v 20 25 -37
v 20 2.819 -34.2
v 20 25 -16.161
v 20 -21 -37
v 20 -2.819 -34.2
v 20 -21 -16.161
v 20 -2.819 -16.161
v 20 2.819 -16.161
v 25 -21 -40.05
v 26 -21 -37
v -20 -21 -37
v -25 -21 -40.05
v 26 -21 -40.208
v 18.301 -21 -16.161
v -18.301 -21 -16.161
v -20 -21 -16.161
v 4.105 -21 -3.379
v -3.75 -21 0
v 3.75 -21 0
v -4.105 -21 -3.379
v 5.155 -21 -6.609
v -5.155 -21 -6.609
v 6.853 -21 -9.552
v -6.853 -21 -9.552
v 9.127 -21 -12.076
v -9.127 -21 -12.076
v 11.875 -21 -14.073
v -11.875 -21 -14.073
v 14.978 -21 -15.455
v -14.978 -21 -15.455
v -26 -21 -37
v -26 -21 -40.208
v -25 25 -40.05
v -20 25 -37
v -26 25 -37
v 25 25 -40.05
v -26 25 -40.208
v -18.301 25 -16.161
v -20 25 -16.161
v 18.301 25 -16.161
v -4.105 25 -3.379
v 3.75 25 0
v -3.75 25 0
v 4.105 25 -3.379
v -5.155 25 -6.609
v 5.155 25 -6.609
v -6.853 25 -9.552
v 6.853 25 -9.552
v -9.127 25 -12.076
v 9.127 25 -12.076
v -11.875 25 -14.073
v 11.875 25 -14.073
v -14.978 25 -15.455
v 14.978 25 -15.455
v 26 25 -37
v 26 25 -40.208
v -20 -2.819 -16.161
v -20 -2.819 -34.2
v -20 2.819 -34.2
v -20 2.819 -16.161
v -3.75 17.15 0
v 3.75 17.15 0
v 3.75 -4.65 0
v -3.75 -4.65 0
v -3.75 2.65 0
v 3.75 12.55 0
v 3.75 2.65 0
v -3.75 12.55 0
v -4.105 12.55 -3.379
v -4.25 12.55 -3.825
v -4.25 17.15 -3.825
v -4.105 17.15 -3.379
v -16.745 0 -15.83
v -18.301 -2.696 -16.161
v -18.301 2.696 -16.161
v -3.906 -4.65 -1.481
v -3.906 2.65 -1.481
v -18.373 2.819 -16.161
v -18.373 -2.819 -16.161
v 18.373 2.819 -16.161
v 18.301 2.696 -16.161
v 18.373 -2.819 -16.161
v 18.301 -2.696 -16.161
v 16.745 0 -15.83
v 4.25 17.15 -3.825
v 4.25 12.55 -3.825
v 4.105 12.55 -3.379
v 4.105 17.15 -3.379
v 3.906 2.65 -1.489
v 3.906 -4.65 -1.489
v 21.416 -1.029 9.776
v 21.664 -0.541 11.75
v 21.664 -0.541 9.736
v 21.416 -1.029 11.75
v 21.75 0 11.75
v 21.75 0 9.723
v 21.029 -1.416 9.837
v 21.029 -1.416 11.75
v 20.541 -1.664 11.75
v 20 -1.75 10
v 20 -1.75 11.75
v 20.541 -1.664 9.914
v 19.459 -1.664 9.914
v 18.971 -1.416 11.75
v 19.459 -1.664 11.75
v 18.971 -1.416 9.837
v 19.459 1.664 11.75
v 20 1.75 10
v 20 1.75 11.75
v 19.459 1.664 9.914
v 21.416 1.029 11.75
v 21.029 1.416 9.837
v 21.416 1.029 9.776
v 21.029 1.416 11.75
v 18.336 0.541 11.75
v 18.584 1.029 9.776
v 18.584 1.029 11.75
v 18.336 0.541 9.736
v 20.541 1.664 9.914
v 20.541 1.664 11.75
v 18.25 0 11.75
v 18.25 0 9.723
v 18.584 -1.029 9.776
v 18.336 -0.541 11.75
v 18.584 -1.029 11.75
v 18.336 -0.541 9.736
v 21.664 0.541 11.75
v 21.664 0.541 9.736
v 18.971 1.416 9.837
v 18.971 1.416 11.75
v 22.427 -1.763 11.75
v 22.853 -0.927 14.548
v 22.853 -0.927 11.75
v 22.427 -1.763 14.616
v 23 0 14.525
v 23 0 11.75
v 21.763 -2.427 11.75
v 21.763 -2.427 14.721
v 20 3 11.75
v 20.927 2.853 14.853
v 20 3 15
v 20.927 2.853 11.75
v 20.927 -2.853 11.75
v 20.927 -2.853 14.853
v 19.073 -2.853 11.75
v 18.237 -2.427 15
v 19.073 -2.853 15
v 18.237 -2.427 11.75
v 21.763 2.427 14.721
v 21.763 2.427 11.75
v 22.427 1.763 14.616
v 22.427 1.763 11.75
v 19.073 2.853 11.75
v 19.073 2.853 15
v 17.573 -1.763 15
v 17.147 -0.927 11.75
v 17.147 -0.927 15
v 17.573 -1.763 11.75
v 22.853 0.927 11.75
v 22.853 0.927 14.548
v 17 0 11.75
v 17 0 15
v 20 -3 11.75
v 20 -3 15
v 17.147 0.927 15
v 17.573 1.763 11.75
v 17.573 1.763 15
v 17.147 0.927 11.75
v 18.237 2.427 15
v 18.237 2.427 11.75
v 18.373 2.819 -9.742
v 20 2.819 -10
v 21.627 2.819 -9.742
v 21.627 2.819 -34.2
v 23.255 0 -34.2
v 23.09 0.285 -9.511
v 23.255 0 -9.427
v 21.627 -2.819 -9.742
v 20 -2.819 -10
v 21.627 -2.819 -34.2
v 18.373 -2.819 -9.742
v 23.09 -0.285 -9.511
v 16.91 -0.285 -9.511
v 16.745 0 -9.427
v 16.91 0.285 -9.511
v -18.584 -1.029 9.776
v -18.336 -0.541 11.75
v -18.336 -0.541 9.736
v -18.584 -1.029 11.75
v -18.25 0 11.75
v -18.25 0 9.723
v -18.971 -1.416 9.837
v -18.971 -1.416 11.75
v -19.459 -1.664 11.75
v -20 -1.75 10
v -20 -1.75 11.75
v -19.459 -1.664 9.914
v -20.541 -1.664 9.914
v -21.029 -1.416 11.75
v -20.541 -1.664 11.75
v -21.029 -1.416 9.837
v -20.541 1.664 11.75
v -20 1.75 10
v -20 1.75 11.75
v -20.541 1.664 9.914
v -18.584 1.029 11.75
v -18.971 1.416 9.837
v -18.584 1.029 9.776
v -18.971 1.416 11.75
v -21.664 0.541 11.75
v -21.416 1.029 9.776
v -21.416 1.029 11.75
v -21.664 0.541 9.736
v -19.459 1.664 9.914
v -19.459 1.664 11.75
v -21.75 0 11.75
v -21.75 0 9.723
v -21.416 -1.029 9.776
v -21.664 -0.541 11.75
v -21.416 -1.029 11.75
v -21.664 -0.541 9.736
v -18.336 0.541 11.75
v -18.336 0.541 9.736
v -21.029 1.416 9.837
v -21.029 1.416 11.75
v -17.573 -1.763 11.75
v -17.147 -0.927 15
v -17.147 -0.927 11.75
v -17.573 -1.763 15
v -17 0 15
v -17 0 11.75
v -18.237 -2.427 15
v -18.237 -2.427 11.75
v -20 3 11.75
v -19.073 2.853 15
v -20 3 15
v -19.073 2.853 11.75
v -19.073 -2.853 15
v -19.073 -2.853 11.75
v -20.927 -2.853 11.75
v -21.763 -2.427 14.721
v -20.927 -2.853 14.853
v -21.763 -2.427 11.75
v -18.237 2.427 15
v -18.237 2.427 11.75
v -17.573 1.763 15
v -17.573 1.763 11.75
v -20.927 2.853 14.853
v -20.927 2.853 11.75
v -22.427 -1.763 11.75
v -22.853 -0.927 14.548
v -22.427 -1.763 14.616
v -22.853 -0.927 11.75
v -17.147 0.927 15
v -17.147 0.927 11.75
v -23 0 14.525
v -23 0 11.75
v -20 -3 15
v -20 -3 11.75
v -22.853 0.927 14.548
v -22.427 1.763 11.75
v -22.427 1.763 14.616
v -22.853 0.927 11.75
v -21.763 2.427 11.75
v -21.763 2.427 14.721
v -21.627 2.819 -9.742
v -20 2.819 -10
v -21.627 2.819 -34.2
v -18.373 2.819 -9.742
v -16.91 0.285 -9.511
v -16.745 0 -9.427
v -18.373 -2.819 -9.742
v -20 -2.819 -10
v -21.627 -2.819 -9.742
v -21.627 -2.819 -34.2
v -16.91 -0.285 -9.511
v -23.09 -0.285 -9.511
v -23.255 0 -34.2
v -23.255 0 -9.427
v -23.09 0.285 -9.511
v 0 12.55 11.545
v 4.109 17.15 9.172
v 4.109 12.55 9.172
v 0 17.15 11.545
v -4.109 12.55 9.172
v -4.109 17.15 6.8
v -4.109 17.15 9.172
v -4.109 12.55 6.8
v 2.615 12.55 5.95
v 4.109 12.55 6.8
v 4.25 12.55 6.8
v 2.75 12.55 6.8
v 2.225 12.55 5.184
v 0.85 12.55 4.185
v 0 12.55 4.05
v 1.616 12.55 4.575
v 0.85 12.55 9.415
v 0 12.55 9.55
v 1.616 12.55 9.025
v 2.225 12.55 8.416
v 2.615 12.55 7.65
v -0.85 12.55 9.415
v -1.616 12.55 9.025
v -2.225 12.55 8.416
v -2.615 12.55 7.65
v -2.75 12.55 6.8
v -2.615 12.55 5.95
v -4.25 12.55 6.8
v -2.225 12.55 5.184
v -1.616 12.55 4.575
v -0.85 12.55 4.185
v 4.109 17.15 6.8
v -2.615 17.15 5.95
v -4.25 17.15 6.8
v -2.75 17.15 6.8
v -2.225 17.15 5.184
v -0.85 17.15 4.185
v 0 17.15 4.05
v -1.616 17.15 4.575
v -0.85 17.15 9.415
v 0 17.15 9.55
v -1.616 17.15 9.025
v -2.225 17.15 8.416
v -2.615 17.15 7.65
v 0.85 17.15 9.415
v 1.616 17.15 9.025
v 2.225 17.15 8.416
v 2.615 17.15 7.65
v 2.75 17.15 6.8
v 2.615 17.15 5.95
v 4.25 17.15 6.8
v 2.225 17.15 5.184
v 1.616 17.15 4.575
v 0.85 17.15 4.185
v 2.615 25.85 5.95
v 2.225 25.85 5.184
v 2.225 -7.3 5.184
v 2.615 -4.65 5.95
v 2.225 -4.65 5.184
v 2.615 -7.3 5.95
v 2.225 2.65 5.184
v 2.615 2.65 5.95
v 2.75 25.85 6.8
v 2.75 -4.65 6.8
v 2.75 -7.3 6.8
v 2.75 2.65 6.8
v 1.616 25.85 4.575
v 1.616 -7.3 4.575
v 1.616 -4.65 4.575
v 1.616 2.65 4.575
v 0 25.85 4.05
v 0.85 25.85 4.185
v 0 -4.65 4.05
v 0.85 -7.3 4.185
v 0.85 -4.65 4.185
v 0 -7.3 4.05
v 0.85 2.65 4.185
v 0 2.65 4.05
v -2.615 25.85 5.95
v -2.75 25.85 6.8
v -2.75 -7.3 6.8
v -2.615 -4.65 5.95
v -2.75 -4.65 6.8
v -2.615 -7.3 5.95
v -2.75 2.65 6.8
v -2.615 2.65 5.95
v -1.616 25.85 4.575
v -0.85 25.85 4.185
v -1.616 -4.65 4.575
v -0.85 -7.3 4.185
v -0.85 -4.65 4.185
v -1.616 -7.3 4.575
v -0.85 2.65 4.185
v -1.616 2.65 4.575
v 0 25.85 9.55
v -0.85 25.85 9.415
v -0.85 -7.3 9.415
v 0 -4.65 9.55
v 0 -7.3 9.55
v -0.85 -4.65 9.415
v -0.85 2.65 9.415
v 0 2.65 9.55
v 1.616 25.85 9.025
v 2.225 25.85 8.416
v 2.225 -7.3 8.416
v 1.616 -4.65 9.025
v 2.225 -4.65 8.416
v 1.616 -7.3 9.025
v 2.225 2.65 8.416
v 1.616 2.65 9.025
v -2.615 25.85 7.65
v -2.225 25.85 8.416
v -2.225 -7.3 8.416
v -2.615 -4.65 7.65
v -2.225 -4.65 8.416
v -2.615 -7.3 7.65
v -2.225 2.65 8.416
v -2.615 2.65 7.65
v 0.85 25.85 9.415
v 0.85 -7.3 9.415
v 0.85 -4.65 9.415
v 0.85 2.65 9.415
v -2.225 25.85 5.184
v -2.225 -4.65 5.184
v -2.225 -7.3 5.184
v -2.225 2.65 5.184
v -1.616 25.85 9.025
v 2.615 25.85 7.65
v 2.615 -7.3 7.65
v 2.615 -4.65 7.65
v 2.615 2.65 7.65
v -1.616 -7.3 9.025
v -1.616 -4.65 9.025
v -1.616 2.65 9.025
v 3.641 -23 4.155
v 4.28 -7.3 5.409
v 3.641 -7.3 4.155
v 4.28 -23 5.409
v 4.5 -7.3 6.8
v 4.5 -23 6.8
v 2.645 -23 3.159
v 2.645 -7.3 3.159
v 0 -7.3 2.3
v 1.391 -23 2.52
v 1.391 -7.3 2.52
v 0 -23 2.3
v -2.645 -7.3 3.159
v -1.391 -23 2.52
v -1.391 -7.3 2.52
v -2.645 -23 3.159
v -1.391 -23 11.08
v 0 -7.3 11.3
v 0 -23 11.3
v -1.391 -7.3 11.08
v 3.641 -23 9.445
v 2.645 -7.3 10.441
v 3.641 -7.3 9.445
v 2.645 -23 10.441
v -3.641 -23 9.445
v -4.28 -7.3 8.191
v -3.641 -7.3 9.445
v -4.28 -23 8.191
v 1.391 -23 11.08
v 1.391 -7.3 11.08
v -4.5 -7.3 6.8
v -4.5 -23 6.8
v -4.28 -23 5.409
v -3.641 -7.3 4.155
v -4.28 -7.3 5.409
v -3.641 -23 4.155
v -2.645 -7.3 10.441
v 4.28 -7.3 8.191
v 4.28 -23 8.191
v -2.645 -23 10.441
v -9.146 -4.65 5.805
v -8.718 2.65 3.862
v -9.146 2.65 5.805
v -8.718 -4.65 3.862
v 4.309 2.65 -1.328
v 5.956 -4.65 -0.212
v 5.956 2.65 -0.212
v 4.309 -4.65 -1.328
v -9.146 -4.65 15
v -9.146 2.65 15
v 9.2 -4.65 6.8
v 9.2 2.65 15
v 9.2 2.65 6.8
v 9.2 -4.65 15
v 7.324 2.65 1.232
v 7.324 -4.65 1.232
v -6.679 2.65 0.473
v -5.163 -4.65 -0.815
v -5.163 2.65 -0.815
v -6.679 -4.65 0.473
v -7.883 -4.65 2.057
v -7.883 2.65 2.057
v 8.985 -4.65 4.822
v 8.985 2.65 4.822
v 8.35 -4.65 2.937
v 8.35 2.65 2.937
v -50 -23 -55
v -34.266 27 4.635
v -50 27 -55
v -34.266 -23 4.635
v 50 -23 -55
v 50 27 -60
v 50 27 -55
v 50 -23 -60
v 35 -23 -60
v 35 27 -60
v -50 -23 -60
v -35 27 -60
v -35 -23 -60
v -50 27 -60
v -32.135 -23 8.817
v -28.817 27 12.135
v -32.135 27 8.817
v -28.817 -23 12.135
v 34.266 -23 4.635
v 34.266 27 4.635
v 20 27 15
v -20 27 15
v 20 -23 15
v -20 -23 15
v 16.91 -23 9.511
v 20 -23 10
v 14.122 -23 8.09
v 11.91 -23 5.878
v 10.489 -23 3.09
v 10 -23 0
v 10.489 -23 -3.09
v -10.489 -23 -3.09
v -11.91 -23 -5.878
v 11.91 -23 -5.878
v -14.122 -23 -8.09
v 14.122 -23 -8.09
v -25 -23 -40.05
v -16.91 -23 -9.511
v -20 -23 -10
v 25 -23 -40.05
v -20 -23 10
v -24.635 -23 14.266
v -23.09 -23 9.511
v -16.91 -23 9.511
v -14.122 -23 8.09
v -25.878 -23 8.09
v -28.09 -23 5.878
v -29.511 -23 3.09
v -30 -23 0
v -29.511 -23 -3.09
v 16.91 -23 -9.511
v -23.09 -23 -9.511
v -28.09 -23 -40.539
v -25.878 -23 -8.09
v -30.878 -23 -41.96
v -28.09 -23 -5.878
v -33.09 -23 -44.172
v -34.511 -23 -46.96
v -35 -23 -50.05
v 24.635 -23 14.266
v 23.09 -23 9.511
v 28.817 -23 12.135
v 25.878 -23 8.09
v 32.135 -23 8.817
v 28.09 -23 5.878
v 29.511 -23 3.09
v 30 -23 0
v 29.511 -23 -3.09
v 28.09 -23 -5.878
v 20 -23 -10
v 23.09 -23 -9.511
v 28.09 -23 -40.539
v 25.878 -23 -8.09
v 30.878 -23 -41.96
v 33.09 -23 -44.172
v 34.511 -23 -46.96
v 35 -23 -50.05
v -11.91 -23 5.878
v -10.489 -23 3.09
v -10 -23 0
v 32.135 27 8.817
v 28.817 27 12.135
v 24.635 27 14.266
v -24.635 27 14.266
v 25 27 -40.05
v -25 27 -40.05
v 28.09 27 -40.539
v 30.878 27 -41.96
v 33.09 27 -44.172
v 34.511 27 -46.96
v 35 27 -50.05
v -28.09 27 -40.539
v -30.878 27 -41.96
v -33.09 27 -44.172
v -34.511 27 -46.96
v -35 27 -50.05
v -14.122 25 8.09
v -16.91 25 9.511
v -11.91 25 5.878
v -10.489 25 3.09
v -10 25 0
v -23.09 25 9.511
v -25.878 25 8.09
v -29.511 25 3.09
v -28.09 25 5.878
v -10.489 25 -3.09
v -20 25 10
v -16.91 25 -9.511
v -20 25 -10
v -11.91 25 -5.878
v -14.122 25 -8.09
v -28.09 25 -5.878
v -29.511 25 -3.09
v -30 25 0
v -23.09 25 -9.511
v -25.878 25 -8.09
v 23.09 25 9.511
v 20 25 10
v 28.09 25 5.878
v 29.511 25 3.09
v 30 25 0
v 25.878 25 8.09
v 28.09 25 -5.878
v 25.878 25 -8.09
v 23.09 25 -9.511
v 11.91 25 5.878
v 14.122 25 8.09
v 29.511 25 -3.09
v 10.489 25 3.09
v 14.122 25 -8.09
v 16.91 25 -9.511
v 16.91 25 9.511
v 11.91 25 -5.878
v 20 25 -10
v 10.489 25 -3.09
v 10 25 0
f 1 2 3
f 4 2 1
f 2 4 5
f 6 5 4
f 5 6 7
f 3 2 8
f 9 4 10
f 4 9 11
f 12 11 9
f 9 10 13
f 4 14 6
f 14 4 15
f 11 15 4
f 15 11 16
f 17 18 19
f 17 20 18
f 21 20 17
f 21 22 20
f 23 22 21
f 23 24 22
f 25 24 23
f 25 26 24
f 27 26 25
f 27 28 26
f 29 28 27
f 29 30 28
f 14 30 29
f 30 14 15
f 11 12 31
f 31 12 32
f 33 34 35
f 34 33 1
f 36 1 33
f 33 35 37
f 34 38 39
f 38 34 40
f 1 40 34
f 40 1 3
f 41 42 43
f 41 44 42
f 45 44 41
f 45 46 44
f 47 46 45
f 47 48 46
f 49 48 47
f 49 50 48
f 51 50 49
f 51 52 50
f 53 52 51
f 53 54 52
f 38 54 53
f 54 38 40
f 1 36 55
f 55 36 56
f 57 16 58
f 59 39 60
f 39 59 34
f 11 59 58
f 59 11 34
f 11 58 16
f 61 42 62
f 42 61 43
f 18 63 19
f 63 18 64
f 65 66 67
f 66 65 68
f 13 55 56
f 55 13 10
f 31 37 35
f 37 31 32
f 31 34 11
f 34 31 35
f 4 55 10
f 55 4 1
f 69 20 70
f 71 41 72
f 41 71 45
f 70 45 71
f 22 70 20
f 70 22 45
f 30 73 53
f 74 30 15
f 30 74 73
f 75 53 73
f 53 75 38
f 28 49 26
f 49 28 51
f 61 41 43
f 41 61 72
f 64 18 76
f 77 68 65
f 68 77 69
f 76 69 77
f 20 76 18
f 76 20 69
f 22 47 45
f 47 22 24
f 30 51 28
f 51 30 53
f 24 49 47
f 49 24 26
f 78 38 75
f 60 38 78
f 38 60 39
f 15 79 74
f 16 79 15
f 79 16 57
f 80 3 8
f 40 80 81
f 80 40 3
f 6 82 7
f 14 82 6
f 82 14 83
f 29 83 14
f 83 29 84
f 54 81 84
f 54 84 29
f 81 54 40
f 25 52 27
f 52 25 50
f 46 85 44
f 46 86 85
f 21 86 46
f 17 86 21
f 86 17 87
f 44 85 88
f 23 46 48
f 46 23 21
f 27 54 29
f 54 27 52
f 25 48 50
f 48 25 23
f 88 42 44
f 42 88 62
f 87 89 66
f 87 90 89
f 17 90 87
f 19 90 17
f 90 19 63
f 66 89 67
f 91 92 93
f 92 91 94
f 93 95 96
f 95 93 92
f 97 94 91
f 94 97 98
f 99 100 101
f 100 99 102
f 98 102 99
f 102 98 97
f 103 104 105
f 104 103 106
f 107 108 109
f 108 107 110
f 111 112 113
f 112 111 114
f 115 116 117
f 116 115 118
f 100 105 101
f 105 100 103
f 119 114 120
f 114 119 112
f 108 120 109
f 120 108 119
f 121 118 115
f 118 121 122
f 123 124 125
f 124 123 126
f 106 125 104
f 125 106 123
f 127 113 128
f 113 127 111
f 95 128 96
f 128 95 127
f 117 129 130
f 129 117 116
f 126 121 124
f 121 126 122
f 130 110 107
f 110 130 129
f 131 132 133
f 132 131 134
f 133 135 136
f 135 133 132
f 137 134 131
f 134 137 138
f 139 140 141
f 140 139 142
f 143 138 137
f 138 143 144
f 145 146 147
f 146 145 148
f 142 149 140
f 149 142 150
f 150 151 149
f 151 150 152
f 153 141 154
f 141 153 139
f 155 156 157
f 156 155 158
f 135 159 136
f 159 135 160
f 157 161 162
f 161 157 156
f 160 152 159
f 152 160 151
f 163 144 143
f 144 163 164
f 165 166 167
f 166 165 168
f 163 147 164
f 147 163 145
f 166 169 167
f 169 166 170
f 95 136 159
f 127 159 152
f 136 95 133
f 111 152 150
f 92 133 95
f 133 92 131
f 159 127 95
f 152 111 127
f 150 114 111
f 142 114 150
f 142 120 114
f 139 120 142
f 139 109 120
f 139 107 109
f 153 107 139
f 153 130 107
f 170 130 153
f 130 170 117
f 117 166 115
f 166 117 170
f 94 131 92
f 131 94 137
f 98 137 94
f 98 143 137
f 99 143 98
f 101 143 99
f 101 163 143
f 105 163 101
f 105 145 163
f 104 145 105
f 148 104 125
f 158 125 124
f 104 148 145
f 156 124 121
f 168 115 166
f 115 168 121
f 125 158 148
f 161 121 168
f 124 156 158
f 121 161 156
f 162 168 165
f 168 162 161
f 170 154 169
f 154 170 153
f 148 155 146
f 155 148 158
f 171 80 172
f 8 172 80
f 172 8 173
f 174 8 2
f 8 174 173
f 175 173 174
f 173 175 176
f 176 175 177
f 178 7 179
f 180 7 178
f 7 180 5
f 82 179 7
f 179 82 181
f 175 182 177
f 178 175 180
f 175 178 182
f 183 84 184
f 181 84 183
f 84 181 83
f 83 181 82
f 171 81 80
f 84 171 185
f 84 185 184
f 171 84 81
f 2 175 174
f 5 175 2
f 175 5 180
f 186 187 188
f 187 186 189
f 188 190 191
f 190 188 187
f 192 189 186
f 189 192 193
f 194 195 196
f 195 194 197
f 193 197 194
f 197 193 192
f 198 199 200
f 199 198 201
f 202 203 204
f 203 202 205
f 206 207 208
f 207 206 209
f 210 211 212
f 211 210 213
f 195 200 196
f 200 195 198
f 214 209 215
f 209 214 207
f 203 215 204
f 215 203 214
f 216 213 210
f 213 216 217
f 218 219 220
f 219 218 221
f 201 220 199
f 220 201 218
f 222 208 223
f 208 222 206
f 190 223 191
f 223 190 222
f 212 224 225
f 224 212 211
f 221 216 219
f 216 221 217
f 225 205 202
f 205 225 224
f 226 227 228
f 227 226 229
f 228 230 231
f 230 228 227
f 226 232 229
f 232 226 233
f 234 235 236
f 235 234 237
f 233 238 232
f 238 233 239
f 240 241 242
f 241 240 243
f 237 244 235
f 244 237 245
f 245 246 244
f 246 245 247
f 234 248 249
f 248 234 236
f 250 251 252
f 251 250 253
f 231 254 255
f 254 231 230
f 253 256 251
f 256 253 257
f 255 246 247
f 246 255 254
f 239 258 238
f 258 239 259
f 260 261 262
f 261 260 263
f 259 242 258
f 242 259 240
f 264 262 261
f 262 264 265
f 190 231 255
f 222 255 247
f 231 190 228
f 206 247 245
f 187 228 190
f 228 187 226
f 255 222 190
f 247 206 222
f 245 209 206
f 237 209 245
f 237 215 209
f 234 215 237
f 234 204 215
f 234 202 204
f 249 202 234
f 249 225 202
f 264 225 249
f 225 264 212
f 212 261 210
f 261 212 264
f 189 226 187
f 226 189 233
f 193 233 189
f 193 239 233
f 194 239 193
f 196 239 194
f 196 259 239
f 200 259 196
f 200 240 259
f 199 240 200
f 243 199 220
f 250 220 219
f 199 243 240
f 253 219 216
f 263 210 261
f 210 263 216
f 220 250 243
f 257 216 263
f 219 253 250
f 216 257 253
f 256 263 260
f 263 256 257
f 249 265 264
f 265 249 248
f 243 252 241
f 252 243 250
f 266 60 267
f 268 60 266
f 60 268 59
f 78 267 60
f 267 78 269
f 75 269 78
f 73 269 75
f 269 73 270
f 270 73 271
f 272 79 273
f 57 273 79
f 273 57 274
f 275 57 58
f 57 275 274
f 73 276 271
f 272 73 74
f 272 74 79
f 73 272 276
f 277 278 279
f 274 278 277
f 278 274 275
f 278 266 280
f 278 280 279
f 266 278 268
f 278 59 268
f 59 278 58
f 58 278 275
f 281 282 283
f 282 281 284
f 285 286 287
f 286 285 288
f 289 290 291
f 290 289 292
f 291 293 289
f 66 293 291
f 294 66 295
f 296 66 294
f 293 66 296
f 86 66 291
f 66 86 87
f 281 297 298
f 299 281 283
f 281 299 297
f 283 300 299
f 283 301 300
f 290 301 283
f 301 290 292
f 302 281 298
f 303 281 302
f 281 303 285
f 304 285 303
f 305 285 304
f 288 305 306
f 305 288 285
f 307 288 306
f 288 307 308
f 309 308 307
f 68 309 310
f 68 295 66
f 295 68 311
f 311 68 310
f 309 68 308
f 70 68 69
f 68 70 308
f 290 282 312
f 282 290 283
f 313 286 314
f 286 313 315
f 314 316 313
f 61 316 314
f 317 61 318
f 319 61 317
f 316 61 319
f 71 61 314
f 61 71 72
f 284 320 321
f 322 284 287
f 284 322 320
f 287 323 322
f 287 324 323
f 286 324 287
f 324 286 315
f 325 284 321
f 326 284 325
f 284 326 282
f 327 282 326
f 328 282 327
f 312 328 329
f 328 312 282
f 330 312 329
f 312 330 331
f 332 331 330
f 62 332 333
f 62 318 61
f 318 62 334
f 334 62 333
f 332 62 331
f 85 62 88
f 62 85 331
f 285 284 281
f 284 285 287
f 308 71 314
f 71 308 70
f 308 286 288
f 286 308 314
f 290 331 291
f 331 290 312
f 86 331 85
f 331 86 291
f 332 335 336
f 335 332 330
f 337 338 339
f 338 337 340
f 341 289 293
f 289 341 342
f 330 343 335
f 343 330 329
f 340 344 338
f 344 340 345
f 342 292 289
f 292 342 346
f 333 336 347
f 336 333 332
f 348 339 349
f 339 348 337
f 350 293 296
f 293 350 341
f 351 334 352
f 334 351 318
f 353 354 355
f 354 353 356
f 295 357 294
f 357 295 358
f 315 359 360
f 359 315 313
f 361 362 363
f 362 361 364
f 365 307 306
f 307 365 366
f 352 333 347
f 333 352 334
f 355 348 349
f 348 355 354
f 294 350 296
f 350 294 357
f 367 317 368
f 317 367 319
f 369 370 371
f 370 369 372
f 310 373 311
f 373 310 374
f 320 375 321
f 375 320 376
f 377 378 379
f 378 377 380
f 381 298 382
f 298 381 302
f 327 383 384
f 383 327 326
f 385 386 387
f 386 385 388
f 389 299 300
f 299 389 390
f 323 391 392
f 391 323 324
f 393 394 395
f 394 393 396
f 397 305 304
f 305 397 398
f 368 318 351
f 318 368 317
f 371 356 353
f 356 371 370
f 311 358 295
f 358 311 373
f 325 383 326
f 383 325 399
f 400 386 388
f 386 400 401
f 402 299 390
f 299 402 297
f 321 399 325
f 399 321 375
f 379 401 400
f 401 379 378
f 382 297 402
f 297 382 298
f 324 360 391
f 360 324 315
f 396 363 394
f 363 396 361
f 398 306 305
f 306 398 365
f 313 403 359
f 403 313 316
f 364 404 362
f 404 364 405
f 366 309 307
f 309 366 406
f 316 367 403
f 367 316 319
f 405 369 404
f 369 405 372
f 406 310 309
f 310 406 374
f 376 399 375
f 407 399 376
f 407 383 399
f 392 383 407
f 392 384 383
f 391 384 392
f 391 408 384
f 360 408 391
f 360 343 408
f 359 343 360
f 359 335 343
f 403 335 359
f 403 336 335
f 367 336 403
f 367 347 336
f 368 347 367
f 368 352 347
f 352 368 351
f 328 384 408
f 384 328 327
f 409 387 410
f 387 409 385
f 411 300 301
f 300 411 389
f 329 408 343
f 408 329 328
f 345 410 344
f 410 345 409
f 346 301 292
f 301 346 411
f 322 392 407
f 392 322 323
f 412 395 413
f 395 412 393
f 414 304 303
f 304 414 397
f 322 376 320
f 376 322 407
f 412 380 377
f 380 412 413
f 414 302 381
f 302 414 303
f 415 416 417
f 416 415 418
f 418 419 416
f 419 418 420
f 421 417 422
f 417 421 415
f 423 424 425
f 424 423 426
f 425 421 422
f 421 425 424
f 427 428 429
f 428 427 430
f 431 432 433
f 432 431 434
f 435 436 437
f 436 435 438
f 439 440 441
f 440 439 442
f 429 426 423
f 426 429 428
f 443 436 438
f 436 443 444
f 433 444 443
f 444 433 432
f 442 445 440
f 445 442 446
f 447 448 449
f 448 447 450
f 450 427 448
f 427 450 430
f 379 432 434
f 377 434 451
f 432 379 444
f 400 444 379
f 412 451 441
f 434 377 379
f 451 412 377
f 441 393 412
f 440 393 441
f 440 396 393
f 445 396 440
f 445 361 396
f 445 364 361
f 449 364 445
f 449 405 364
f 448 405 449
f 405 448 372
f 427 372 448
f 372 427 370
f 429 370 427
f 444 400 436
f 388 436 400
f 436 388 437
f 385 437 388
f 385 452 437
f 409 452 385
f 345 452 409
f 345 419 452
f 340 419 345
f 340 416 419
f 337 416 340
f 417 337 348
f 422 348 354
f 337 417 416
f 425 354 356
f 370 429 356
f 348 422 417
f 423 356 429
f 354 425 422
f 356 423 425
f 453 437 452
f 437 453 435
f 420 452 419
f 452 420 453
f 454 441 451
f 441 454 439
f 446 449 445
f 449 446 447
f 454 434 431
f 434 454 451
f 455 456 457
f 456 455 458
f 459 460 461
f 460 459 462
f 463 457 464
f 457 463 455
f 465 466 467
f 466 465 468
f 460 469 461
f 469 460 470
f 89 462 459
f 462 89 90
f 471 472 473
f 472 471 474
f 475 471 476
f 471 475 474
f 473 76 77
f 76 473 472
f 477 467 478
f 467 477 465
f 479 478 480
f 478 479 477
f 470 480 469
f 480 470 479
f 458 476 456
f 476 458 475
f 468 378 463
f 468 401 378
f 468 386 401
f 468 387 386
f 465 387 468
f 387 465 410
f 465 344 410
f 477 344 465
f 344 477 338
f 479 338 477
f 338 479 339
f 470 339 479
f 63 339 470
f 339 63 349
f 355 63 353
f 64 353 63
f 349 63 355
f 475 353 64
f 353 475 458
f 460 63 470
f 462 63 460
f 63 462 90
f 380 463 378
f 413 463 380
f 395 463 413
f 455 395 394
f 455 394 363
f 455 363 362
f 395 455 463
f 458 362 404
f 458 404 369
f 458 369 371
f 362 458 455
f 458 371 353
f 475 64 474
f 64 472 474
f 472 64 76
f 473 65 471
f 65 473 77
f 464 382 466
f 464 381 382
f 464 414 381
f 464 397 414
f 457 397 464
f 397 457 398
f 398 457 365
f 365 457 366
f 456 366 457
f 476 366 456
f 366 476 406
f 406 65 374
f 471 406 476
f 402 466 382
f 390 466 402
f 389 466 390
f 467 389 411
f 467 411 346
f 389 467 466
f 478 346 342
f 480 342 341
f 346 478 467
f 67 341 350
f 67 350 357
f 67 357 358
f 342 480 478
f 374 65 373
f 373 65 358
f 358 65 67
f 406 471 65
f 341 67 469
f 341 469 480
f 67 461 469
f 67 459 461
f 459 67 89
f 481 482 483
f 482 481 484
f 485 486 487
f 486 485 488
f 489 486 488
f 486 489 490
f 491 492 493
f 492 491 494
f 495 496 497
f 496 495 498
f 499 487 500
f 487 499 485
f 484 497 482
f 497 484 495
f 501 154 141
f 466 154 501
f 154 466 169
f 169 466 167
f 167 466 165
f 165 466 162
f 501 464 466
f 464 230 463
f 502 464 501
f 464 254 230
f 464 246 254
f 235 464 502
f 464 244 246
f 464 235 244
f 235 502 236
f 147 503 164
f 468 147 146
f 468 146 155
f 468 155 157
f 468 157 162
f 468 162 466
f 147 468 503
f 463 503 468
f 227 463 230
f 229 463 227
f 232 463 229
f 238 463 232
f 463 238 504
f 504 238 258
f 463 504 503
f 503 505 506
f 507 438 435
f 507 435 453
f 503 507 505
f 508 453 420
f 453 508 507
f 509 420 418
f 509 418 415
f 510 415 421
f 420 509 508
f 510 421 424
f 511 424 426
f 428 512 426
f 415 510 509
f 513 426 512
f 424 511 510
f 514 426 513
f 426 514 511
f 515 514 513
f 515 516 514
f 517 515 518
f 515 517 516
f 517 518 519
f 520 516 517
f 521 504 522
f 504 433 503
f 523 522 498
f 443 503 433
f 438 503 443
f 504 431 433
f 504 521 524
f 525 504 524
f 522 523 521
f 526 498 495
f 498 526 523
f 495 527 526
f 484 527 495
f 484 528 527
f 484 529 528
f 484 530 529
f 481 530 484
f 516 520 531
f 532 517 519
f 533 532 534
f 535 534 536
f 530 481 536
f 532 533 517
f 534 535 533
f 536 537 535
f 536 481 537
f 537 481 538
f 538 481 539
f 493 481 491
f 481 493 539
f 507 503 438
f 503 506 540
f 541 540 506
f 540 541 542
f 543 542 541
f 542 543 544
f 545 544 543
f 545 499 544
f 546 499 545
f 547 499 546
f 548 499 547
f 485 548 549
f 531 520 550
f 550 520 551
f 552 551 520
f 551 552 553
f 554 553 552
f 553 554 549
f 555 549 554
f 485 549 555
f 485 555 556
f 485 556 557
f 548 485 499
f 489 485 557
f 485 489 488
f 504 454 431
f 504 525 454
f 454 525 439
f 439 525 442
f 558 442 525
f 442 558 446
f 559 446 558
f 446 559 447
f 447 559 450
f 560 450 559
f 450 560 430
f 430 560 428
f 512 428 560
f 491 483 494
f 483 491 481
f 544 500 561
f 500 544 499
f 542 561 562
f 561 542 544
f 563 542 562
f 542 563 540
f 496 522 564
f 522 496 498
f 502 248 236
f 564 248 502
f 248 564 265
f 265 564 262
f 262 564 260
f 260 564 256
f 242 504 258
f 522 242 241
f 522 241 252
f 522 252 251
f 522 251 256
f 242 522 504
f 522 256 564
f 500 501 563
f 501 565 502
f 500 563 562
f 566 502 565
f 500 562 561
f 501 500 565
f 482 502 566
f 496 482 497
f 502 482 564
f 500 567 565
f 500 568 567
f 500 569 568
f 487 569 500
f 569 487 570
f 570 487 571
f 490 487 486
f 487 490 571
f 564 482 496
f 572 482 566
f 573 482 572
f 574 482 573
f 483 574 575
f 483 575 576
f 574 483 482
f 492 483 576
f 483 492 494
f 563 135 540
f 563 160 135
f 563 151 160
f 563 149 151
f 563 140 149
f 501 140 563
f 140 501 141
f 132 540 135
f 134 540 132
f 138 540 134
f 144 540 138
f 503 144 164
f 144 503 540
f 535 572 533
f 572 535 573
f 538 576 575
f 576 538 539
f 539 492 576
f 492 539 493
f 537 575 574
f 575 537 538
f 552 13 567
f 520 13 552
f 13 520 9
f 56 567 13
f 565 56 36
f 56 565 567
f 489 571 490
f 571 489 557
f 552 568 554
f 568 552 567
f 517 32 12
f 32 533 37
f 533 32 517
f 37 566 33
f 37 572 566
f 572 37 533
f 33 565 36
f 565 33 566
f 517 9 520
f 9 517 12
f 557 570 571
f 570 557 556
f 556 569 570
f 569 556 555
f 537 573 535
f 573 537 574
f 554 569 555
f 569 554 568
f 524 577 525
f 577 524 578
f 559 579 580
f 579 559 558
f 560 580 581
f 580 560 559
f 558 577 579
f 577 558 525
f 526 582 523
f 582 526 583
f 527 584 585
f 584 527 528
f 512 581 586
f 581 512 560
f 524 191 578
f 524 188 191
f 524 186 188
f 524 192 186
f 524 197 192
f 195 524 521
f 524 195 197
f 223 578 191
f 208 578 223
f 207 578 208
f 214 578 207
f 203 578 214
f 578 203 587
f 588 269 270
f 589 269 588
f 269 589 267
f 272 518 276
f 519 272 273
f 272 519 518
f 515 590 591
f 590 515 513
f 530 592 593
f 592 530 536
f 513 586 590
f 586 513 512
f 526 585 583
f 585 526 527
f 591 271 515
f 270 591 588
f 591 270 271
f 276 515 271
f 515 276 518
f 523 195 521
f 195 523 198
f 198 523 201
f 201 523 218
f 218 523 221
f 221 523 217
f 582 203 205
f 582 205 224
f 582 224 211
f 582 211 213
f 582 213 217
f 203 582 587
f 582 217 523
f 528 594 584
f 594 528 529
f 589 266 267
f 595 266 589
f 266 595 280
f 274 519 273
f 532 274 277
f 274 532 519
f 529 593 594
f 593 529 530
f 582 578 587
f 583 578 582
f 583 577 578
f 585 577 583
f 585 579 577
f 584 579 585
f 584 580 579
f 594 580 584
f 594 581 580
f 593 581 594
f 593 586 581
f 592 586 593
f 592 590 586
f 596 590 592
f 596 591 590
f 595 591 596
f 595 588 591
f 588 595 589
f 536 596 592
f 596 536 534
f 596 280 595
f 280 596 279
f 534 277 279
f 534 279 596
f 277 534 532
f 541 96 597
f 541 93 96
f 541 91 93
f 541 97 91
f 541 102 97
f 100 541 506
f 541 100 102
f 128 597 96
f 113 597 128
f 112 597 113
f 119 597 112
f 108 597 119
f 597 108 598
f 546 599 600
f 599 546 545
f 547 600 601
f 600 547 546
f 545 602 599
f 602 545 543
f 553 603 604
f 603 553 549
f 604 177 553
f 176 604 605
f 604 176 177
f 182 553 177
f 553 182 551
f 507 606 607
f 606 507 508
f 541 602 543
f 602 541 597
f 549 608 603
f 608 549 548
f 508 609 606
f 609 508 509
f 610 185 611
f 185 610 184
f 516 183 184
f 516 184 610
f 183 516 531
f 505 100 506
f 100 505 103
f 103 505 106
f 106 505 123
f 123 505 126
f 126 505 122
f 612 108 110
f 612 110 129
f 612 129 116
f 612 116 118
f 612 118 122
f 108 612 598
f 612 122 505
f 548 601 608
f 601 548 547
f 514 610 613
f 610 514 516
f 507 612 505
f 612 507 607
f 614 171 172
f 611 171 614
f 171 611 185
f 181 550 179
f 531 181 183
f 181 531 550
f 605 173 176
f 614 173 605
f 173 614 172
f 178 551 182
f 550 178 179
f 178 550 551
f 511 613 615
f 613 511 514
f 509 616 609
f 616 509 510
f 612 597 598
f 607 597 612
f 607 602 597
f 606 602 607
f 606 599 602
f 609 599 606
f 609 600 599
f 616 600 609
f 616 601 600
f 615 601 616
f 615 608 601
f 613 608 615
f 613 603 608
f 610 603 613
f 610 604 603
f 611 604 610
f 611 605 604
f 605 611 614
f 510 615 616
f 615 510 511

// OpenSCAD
translate(v = [0, 27.0000000000, 0]) {
	rotate(a = [90, 0, 0]) {
		difference() {
			hull() {
				union() {
					translate(v = [-20.0000000000, 0, 0]) {
						cylinder($fn = 20, d = 30, h = 50);
					}
					translate(v = [20.0000000000, 0, 0]) {
						cylinder($fn = 20, d = 30, h = 50);
					}
					translate(v = [-50.0000000000, -60, 0]) {
						cube(size = [100, 5, 50]);
					}
				}
			}
			hull() {
				translate(v = [0, -50.0500000000, -0.0250000000]) {
					union() {
						translate(v = [-25.0000000000, 0, 0]) {
							cylinder($fn = 20, d = 20, h = 50.0500000000);
						}
						translate(v = [25.0000000000, 0, 0]) {
							cylinder($fn = 20, d = 20, h = 50.0500000000);
						}
						translate(v = [-35.0000000000, -10, 0]) {
							cube(size = [70, 5, 50.0500000000]);
						}
					}
				}
			}
			difference() {
				union() {
					translate(v = [-20.0000000000, -60, 2]) {
						cube(size = [40, 60, 46]);
					}
					translate(v = [-26.0000000000, -60, 2]) {
						cube(size = [52.0000000000, 23.0000000000, 46]);
					}
				}
				translate(v = [-20.0000000000, 0, 0]) {
					cylinder(d = 32.5000000000, h = 50);
				}
				translate(v = [20.0000000000, 0, 0]) {
					cylinder(d = 32.5000000000, h = 50);
				}
			}
			translate(v = [-20.0000000000, 0, 2]) {
				cylinder($fn = 20, d = 20, h = 50);
			}
			translate(v = [20.0000000000, 0, 2]) {
				cylinder($fn = 20, d = 20, h = 50);
			}
			translate(v = [20.0000000000, 15.0000000000, 27.0000000000]) {
				rotate(a = [90, 0, 0]) {
					translate(v = [0, 0, 3.2000000000]) {
						union() {
							translate(v = [0, 0, false]) {
								cylinder($fn = 20, d = 3.5000000000, h = 38.2000000000);
							}
							translate(v = [0, 0, -13.1500000000]) {
								cylinder($fn = 20, d = 6.0000000000, h = 13.2000000000);
							}
							translate(v = [0, 0, 21]) {
								cylinder($fn = 6, d = 6.5100000000, h = 25);
							}
						}
					}
				}
			}
			translate(v = [-20.0000000000, 15.0000000000, 27.0000000000]) {
				rotate(a = [90, 0, 0]) {
					translate(v = [0, 0, 3.2000000000]) {
						union() {
							translate(v = [0, 0, false]) {
								cylinder($fn = 20, d = 3.5000000000, h = 38.2000000000);
							}
							translate(v = [0, 0, -13.1500000000]) {
								cylinder($fn = 20, d = 6.0000000000, h = 13.2000000000);
							}
							translate(v = [0, 0, 21]) {
								cylinder($fn = 6, d = 6.5100000000, h = 25);
							}
						}
					}
				}
			}
			translate(v = [0, 6.8000000000, 24.3500000000]) {
				hull() {
					cylinder(d = 18.4000000000, h = 7.3000000000);
					translate(v = [0, 16.4000000000, 0]) {
						cylinder(d = 18.4000000000, h = 7.3000000000);
					}
				}
				rotate(a = [180, 0, 0]) {
					translate(v = [0, 0, -10.0000000000]) {
						union() {
							translate(v = [0, 0, false]) {
								cylinder($fn = 20, d = 5.5000000000, h = 33.2000000000);
							}
							translate(v = [0, 0, -55.1500000000]) {
								cylinder($fn = 20, d = 9.0000000000, h = 55.2000000000);
							}
							translate(v = [0, 0, 19.9000000000]) {
								rotate(a = [90, 0, 180]) {
									union() {
										rotate(a = [-90, 90, 0]) {
											cylinder($fn = 6, d = 9.4900000000, h = 4.6000000000);
										}
										translate(v = [-4.2500000000, 0, 0]) {
											cube(size = [8.5000000000, 4.6000000000, 100]);
										}
									}
								}
							}
						}
					}
				}
			}
		}
	}
}
/***********************************************
*********      SolidPython code:      **********
************************************************
 
import os
cq = 20

render = False
os.environ["PRINTEDSCOPE_QUALITY"] = str(cq)

from lib.global_parameters import *
from lib.model_parameters import *
from solid import *
from solid.utils import *
import numpy as np


g1p1_bearing = bearing_625
g1g1_space = 3 # jak velka bude mezera mezi zakladnou na zemi a AZ sestavou
g1p1_pipe_center_distance = 20 # jak daleko konci trubka od stredu
g1_pipe_in = 40
g1p1_diameter = 60
g1_foot_height = 60
g1_pipe_bolt = get_optimal_bolt(3, base_pipe['D']+5)



g1_foot_length = 100
g1_foot_width = 50
g1_pipe_distance = 40
g1_pipe = pipe_20_2
g1_pipe['min_wall'] = 5
g1p4_wall = 2

g1_foot_bridge_height = 10
g1_foot_bridge_length =  g1_foot_length-50

#g1_foot_length = g1_pipe_distance+g1_pipe['D']+2*g1_pipe['min_wall']

# kostka, na ktere to lezi na zemi...
g1p2_width = 50
g1p2_length = 100
g1p2_height = g1_foot_height

def s111g1p01():
	pipe_bolt = g1_pipe_bolt
	pipe_height = pipe_bolt['l']
	pipe_height += pipe_bolt['k']
	bottom = -(pipe_height-g1_pipe['min_wall']-g1_pipe['D']/2)-clear

	m= cylinder(h=pipe_height, d=100)
	for x in range(3):
		m+= rotate([0, 0, 360/3*x])(
			translate([0, -(g1_pipe['D']+g1_pipe_distance+2*g1_pipe['min_wall'])/2,0])(
				cube([g1p1_diameter, g1_pipe['D']+g1_pipe_distance+2*g1_pipe['min_wall'], pipe_height])
			)
		)
	m = down(pipe_height-g1_pipe['min_wall']-g1_pipe['D']/2)(m)
	#m = hull()(m)

	m+= up(pipe_height/2-1.1)(
			difference()(
				cylinder(h=5, d=80, segments=cq),
				down(clear/2)(cylinder(h=10+clear, d=80-3, segments=cq))
			)
		)
	
	m-=(up(pipe_height/2-g1_pipe['min_wall']+1)(cylinder(h=5+clear, d1=80-3-5, d2=80-3, segments=cq)))


	for x in range(3):
		m-= rotate([0, 90, 360/3*x])(
			# diry pro zastrceni trubky
			translate([0, -g1_pipe_distance/2, g1p1_pipe_center_distance])(
				cylinder(d= base_pipe['D'], h=100, segments=cq)
			),
			translate([0, g1_pipe_distance/2, g1p1_pipe_center_distance])(
				cylinder(d= base_pipe['D'], h=100, segments=cq)
			),
			# diry pro pridelani trubek
			translate([2, -g1_pipe_distance/2, g1p1_diameter*0.75])(
				rotate([0, -90, 0])(
					bolt_hole(pipe_bolt, nut=-3, align='center')
				)
			),
			translate([2, g1_pipe_distance/2, g1p1_diameter*0.75])(
				rotate([0, -90, 0])(
					(bolt_hole(pipe_bolt, nut=-3, align='center'))
				)
			),

			# otvor pro srouby pro pridelani lozisek
			translate([0, 0, (g1p1_bearing['D'])])(
				left(bottom+pipe_height-2-M3['k']-g1p1_bearing['B'])(
					rotate([0, 180, 90])(
						nut_pocket(pipe_bolt, g1p1_bearing['D'])
					)
				),
				left(bottom-1+M3['m']+g1p1_bearing['B'])(
					rotate([0, 180, 90])(
						nut_pocket(pipe_bolt, g1p1_bearing['D'])
					)
				),
				left(bottom+50)(rotate([0, 90, 0])(
					cylinder(d=M3['d'], h=100, segments=cq)
				))
			)
		)

	# dira pro vyvedeni kabelu
	m -= translate([20, base_pipe['D'], bottom+pipe_height/2+clear])(
			cylinder(d=10, h=pipe_height/2+clear)
		)
	m -= translate([20, -base_pipe['D'], bottom+pipe_height/2+clear])(
			cylinder(d=10, h=pipe_height/2+clear)
		)

	# diry skrz pro loziska a sroub M5 a osazeni pro pridelani loziska
	m -= up(bottom)(
			cylinder(d=g1p1_bearing['D']+4*M3['dk']+1, h=M3['k']+2)
		)
	m -= up(bottom+M3['k']+2+layer*1)(
			cylinder(d=g1p1_bearing['D'], h=g1p1_bearing['B'])
		)
	m -= up(bottom+M3['k']+2+layer*2+g1p1_bearing['B'])(
			cylinder(d=g1p1_bearing['D']-4, h=50)
		)
	m -= up(bottom+pipe_height-M3['k']-2- g1p1_bearing['B'])(
			cylinder(d=g1p1_bearing['D'], h=g1p1_bearing['B'])
		)
	m -= up(bottom+pipe_height-M3['k']-2-clear)(
			cylinder(d=g1p1_bearing['D']+4*M3['dk']+1, h=50)
		)

	return m

def s111g1p02():
	m = cylinder(d=g1p1_bearing['D']+4*M3['dk'], h=M3['k']+2)
	m-= down(clear/2)(cylinder(d=g1p1_bearing['bolt']['dk']+1, h=M3['k']+2+clear))
	for x in range(3):
		m-=rotate([180, 0, 360/3*x])(
			translate([-g1p1_bearing['D'], 0, -M3['k']])(
				bolt_hole(M3, l=30)
			)
		)

	return m

def s111g1p03():
	m = cylinder(d=g1p1_bearing['D']+4*M3['dk'], h=M3['k']+2)
	m-= down(clear/2)(cylinder(h=3, d=25))
	m-= down(clear/2)(cylinder(d=g1p1_bearing['D']-3, h=M3['k']+2+clear))
	for x in range(3):
		m-=rotate([180, 0, 360/3*x])(
			translate([-g1p1_bearing['D'], 0, -M3['k']])(
				bolt_hole(M3, l=30)
			)
		)

	return m

def s111g1p04():

	## zakladni tvar nohy
	m = left(g1_pipe_distance/2)(
			cylinder(h=g1_foot_width, d=g1_pipe['D']+g1_pipe['min_wall']*2, segments=cq)
		)
	m += right(g1_pipe_distance/2)(
			cylinder(h=g1_foot_width, d=g1_pipe['D']+g1_pipe['min_wall']*2, segments=cq)
		)
	m += translate([-g1_foot_length/2, -g1_foot_height, 0])(
			cube([g1_foot_length, 5, g1_foot_width])
		)
	m = hull()(m)


	## odebrani premosteni
	r = left(g1_foot_bridge_length/2)(
			cylinder(h=g1_foot_width+clear, d=g1_pipe['D'], segments=cq)
		)
	r += right(g1_foot_bridge_length/2)(
			cylinder(h=g1_foot_width+clear, d=g1_pipe['D'], segments=cq)
		)
	r += translate([-(g1_foot_bridge_length+g1_pipe['D'])/2, -g1_foot_bridge_height, 0])(
			cube([(g1_foot_bridge_length+g1_pipe['D']), 5, g1_foot_width+clear])
		)
	r = hull()(translate([0, -g1_foot_height+g1_foot_bridge_height-clear, -clear/2])(r))
	m-=r


	## odebrani diry pro elektroniku
	r = translate([-g1_pipe_distance/2, -g1p2_height, g1p4_wall])(
			cube([g1_pipe_distance, g1p2_height, g1_foot_width-2*g1p4_wall])
		)
	r += translate([-g1_pipe_distance/2-M3['dk']*1, -g1p2_height, g1p4_wall])(
			cube([g1_pipe_distance+M3['dk']*2, g1_foot_bridge_height+base_pipe['D']/2+5, g1_foot_width-2*g1p4_wall])
		)
	
	r -= left(g1_pipe_distance/2)(
			cylinder(h=g1_foot_width, d=g1_pipe['D']+2.5*g1_pipe['min_wall'])
		)
	r -= right(g1_pipe_distance/2)(
			cylinder(h=g1_foot_width, d=g1_pipe['D']+2.5*g1_pipe['min_wall'])
		)
	#r -= up(20)(
	#		cylinder(h=g1_foot_width-20, d=g1p1_bearing['D']+1)
	#	)
	m-=(r)

	## diry na trubky a srouby skrz trubky
	m -= translate([-g1_pipe_distance/2, 0, 2])(
			cylinder(h=g1_foot_width, d=g1_pipe['D'], segments=cq)
		)
	m -= translate([g1_pipe_distance/2, 0,2])(
			cylinder(h=g1_foot_width, d=g1_pipe['D'], segments=cq)
		)
	m -= translate([g1_pipe_distance/2, g1_pipe['D']/2+g1_pipe['min_wall'], 2+g1p1_diameter*0.75-g1p1_pipe_center_distance])(
			bolt_hole(M3, align='head', rotation=np.array([-1,0,0]), nut=-4)
			)
	m -=translate([-g1_pipe_distance/2, g1_pipe['D']/2+g1_pipe['min_wall'], 2+g1p1_diameter*0.75-g1p1_pipe_center_distance])(
			bolt_hole(M3, align='head', rotation=np.array([-1,0,0]), nut=-4)
		)

	m-= translate([0, g1_pipe['D']/2+g1_pipe['min_wall']-g1p1_bearing['D']/2, g1_foot_width/2+2-g1p1_bearing['B']/2])(
			hull()(
				cylinder(d=g1p1_bearing['D']+2, h=g1p1_bearing['B']+2),
				forward(g1p1_bearing['D'])(cylinder(d=g1p1_bearing['D']+2, h=g1p1_bearing['B']+2))
			),
			bolt_hole(M5, l=20, overlap =8, head_overlap=50, align='center', nut = -0.1, nut_type='nut_pocket', nut_rotation=180)
		)

	return forward(g1_foot_width/2+2)(rotate([90, 0, 0])(m))

def s111g1p05():
	m = s111g1p04()
	return m

def s111g1p06():

	## zakladni tvar nohy
	m = left(g1_pipe_distance/2)(
			cylinder(h=g1_foot_width, d=g1_pipe['D']+g1_pipe['min_wall']*2, segments=cq)
		)
	m += right(g1_pipe_distance/2)(
			cylinder(h=g1_foot_width, d=g1_pipe['D']+g1_pipe['min_wall']*2, segments=cq)
		)
	m = hull()(m)

	## diry na trubky a srouby skrz trubky
	m -= translate([-g1_pipe_distance/2, 0, -clear])(
			cylinder(h=g1_foot_width+2*clear, d=g1_pipe['D'], segments=cq)
		)
	m -= translate([g1_pipe_distance/2, 0, -clear])(
			cylinder(h=g1_foot_width+2*clear, d=g1_pipe['D'], segments=cq)
		)
	m -= translate([g1_pipe_distance/2, g1_pipe['D']/2+g1_pipe['min_wall'], 2+g1p1_diameter*0.75-g1p1_pipe_center_distance])(
			bolt_hole(M3, align='head', rotation=np.array([-1,0,0]), nut=-4)
			)
	m -=translate([-g1_pipe_distance/2, g1_pipe['D']/2+g1_pipe['min_wall'], 2+g1p1_diameter*0.75-g1p1_pipe_center_distance])(
			bolt_hole(M3, align='head', rotation=np.array([-1,0,0]), nut=-4)
		)

	m-= translate([0, g1_pipe['D']/2+g1_pipe['min_wall']-g1p1_bearing['D']/2, g1_foot_width/2+2-g1p1_bearing['B']/2])(
			hull()(
				cylinder(d=g1p1_bearing['D']+2, h=g1p1_bearing['B']+2),
				forward(g1p1_bearing['D'])(cylinder(d=g1p1_bearing['D']+2, h=g1p1_bearing['B']+2))
			),
			bolt_hole(M5, l=20, overlap =8, head_overlap=50, align='center', nut = -0.1, nut_type='nut_pocket', nut_rotation=180)
		)

	return forward(g1_foot_width/2+2)(rotate([90, 0, 0])(m))


def s111g1p07():
	m = up(5/2)(cube([g1_pipe_distance+M3['dk']*2, g1_foot_bridge_height+base_pipe['D']/2+5, 5], center=True))
	for x in [-10, 10]:
		for y in [-5, 5]:
			m-=translate([x,y,0])(cylinder(d=M3['d'], h=10, segments=cq))
			m-=translate([x,y,2+clear])(cylinder(d=M3['dk'], h=3, segments=cq))
	return m




def s111g1d01():
	m = translate([-g1_pipe['D'], -g1_pipe['D'], -2])(cube([g1_pipe['D']*2, g1_pipe['D']*2, 35]))
	m-= cylinder(h=g1p1_diameter, d=g1_pipe['D'])
	m-= translate([0,0,g1p1_diameter*0.75-g1p1_pipe_center_distance])(rotate([0,90,0])(bolt_hole(M3, l=g1_pipe['D']+4, nut=g1_pipe['D']+4, align='center')))

	return m

def s111g1_info():
	print("\nInformace o dilech 111_10**.scad")
	print("===============================")
	print("Statická základna dalekohledu")
	print("Skrz trubky je sroub", g1_pipe_bolt)
	print("Stredy trubek jsou vzdaleny", g1_pipe_distance)
	print("AL tyce o D: {} mm, delka: {} mm, {}ks".format(base_pipe['D'], g2_octangle_do/2+g1p2_width/2-2-g1p1_pipe_center_distance, 6))


scad_render_to_file(s111g1p01(), '../scad/111_1001.scad')
scad_render_to_file(s111g1p02(), '../scad/111_1002.scad')
scad_render_to_file(s111g1p03(), '../scad/111_1003.scad')
scad_render_to_file(s111g1p04(), '../scad/111_1004.scad')
scad_render_to_file(s111g1p05(), '../scad/111_1005.scad')
scad_render_to_file(s111g1p06(), '../scad/111_1006.scad')
scad_render_to_file(s111g1p07(), '../scad/111_1007.scad')

render = False
if render:
	cq = 100
	generate(s111g1p01(), '111_1001')
	generate(s111g1p02(), '111_1002')
	generate(s111g1p03(), '111_1003')
	generate(s111g1p04(), '111_1004')
	generate(s111g1p05(), '111_1005')
	generate(s111g1p06(), '111_1006')
	generate(s111g1p07(), '111_1007') 
 
************************************************/
